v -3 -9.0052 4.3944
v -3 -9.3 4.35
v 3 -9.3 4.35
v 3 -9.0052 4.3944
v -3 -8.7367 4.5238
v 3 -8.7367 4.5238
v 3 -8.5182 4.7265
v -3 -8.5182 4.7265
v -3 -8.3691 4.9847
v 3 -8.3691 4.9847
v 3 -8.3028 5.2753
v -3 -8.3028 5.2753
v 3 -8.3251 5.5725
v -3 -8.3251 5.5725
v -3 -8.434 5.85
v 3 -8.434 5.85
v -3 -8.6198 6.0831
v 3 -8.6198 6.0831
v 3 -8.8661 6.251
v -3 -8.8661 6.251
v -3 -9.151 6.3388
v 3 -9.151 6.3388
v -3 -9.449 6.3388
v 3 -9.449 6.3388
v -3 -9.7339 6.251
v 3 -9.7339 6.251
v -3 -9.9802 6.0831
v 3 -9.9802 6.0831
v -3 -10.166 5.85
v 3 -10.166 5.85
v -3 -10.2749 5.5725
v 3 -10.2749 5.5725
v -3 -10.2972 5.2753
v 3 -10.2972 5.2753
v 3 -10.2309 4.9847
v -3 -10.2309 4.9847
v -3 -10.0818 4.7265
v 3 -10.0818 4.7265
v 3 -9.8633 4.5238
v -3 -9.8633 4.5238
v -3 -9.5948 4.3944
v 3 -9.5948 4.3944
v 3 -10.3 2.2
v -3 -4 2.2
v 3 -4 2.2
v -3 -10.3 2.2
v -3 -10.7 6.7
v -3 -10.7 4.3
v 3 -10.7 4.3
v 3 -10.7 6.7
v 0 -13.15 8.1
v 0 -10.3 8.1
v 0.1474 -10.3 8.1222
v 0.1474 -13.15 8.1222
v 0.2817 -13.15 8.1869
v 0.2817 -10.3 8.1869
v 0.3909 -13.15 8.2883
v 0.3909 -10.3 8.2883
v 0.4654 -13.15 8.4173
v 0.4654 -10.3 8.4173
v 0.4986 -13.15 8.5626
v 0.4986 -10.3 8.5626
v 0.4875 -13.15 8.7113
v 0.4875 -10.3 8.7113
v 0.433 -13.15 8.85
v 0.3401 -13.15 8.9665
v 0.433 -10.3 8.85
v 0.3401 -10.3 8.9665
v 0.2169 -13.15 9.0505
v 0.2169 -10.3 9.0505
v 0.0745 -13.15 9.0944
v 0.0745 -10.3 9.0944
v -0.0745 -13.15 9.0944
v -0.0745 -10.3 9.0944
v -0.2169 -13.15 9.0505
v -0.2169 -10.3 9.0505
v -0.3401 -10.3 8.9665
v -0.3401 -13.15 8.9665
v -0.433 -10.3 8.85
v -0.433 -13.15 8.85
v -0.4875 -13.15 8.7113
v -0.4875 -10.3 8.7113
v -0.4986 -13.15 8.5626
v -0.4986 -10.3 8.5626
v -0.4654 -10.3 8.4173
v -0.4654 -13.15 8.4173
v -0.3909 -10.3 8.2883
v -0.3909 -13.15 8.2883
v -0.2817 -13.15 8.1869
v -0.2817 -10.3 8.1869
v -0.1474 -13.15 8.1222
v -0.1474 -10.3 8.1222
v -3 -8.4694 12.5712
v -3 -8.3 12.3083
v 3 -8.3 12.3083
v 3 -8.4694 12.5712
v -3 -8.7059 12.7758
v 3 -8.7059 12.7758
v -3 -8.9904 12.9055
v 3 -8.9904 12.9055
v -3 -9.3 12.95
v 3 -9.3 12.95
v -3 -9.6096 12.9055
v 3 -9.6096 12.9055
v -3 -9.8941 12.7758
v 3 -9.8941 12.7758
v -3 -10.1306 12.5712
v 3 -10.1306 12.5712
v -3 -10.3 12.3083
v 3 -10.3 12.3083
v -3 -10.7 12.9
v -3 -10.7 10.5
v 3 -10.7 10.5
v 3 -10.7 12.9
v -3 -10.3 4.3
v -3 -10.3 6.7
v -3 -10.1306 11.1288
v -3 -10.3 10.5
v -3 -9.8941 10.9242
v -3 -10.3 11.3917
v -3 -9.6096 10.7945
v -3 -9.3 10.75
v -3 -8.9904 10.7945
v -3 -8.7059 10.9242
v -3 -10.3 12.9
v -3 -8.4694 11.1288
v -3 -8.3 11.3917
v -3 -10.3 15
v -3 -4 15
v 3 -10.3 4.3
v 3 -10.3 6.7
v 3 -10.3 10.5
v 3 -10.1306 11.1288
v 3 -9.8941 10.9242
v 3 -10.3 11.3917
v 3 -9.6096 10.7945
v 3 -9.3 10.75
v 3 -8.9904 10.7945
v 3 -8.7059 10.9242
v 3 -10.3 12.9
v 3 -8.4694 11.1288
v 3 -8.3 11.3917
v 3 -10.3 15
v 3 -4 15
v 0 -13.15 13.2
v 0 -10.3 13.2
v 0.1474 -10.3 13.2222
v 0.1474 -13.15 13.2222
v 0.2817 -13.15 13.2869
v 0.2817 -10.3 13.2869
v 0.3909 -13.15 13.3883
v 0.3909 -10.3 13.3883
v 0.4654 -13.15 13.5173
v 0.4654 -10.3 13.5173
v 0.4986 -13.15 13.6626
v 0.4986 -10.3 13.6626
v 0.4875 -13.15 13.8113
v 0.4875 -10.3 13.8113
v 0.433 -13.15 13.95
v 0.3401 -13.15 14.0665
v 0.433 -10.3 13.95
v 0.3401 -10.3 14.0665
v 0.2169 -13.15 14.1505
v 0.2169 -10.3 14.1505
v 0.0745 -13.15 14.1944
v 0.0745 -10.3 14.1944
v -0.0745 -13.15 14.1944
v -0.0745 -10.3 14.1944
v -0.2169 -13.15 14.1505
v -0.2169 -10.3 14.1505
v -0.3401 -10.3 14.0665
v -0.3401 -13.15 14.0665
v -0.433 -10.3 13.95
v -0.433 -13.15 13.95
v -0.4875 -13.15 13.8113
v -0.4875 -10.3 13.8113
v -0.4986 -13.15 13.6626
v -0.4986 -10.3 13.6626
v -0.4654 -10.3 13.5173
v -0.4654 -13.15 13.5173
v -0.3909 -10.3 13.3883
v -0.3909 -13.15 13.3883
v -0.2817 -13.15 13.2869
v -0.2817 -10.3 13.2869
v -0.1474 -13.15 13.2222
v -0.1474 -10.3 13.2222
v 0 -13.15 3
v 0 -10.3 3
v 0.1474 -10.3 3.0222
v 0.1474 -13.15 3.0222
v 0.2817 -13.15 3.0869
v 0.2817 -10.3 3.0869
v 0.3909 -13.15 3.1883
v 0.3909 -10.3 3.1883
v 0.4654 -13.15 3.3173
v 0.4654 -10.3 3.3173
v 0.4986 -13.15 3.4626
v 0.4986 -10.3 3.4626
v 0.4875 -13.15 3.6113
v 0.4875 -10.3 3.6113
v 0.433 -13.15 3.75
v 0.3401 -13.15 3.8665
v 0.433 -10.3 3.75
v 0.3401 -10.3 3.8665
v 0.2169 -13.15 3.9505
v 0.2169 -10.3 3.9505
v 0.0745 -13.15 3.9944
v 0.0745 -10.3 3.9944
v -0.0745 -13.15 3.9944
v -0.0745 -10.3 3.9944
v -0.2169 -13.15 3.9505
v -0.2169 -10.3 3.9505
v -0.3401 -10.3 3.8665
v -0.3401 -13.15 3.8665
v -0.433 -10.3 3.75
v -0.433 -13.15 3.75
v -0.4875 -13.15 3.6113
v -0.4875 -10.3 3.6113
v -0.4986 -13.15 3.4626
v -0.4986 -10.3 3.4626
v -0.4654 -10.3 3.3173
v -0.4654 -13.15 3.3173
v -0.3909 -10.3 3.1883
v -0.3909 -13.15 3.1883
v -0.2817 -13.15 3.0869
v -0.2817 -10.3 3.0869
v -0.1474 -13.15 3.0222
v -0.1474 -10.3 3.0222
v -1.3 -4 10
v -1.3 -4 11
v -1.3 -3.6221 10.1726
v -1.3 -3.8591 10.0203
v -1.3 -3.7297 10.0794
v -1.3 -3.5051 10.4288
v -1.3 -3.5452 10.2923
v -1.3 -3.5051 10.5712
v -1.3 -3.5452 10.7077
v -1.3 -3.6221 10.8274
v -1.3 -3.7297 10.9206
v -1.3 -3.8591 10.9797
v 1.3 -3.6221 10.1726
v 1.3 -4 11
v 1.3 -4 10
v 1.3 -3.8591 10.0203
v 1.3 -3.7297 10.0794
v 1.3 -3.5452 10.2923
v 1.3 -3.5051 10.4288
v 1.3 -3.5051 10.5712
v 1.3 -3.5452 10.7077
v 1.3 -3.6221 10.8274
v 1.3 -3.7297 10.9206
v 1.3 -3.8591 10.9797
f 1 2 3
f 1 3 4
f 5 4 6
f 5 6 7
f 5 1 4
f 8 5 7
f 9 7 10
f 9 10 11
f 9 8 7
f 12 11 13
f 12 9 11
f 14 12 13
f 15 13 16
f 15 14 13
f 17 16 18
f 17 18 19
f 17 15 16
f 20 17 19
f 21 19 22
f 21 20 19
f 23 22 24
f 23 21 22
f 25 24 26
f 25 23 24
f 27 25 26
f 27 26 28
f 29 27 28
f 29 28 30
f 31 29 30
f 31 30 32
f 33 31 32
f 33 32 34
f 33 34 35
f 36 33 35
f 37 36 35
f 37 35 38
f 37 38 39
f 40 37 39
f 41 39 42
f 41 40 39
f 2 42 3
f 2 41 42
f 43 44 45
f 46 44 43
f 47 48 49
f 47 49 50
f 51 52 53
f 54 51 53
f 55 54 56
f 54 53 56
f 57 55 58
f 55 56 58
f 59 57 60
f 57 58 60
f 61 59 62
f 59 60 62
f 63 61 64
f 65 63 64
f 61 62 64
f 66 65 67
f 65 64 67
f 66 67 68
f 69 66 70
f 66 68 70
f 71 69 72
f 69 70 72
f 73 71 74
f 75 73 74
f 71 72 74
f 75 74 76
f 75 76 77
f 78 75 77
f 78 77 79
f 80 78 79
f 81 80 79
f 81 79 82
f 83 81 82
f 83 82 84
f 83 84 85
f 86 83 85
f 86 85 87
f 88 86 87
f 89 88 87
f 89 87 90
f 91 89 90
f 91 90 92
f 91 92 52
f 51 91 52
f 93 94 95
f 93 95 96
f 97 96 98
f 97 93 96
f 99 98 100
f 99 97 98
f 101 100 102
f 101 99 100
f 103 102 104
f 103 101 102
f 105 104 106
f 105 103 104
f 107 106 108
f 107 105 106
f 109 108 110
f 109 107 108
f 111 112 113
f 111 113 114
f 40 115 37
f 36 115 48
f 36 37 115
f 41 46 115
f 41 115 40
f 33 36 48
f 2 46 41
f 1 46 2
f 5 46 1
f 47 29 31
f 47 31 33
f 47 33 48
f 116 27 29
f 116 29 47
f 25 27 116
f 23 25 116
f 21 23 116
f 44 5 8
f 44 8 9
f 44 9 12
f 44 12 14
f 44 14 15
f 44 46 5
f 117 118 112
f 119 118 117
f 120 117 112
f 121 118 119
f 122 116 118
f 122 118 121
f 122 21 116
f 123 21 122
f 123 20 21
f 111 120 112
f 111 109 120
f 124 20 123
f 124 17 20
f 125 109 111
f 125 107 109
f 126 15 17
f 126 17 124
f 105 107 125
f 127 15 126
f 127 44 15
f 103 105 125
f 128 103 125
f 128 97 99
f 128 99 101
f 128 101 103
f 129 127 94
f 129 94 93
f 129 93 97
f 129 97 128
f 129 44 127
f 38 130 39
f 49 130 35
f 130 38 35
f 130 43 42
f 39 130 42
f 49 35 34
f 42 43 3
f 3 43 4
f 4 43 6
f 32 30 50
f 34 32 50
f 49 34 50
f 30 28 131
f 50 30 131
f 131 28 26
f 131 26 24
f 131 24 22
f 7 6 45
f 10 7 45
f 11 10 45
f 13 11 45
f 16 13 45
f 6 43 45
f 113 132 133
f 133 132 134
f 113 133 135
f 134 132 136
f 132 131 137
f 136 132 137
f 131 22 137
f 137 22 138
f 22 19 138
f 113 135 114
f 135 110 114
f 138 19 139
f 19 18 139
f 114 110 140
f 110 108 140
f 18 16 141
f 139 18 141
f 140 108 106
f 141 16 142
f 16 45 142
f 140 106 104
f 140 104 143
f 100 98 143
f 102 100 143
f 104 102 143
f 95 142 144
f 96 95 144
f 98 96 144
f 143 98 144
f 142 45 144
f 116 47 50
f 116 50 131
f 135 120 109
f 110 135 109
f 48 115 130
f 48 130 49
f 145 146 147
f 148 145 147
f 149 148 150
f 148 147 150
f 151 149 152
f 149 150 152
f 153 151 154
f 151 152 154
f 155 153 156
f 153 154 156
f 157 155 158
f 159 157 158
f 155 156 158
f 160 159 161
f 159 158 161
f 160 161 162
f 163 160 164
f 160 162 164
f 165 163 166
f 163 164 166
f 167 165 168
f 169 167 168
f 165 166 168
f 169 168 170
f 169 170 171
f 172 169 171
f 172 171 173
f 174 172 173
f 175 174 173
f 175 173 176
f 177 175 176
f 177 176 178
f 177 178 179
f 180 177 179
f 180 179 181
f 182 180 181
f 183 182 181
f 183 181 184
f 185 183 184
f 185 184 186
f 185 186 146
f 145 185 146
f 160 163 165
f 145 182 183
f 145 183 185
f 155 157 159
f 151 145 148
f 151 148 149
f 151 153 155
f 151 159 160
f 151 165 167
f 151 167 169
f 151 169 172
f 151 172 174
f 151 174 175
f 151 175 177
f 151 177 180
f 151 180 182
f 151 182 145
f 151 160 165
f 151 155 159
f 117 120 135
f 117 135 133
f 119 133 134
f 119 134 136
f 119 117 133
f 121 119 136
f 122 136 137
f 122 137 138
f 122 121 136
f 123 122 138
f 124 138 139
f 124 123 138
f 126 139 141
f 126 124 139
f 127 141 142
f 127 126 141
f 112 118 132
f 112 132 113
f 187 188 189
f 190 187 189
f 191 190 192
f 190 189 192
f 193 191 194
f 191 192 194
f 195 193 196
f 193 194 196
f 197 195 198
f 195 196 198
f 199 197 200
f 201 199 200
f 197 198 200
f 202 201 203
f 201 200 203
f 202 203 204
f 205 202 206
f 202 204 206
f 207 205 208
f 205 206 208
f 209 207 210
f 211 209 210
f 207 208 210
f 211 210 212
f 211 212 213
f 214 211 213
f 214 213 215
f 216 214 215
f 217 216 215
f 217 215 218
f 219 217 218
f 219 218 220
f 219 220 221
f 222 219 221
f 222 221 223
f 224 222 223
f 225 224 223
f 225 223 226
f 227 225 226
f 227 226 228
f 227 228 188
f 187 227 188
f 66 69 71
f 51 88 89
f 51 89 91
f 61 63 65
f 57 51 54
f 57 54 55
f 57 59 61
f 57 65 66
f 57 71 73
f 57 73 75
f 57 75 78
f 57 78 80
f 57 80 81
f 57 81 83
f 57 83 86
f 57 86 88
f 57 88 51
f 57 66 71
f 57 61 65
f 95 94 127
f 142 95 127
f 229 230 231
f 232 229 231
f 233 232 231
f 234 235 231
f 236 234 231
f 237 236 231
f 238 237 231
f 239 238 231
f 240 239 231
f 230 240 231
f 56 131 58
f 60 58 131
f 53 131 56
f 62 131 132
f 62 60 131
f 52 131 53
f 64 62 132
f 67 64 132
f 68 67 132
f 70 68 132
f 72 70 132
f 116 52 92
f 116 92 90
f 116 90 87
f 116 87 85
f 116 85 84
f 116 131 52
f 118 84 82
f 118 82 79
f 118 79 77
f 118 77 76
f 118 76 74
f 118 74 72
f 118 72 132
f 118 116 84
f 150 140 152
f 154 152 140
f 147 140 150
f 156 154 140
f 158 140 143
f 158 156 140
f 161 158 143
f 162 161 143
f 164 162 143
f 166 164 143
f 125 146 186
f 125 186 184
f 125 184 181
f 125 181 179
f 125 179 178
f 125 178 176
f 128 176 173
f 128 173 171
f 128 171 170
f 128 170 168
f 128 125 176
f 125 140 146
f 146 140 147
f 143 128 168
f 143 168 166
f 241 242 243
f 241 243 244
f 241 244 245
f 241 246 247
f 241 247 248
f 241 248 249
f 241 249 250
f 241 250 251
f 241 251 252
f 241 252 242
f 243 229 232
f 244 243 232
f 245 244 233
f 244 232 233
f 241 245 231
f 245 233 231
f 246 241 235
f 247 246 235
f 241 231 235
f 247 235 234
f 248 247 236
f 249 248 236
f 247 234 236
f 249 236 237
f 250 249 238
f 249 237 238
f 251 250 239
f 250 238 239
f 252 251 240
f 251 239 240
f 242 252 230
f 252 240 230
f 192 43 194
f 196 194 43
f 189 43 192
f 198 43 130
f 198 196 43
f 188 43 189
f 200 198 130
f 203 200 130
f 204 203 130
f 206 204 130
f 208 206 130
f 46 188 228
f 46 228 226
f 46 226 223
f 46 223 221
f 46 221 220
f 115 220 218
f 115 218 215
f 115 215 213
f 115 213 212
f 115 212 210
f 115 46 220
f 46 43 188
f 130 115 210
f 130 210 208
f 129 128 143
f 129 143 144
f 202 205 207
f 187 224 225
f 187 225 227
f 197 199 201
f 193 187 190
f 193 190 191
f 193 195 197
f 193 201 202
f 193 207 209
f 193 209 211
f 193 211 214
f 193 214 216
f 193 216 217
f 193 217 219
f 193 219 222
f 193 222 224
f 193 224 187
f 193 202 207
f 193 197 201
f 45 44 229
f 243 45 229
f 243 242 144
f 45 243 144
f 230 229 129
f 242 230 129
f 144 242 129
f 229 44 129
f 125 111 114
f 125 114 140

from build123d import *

# Parameters (mm, degrees)
SKETCH090_R             = 1
PAD055_DEPTH            = 6
CYLINDER080_R           = 0.5
CYLINDER080_DEPTH       = 3
LINEARPATTERN001_COUNT  = 3
LINEARPATTERN001_PITCH  = 5.1
CYLINDER081_R           = 0.5
CYLINDER081_DEPTH       = 2.6
BODY073_PITCH_ANGLE     = 88.936822
BODY073_PLACEMENT_ANGLE = -90
BODY074_ROLL_ANGLE      = 1.063178
BODY074_PLACEMENT_ANGLE = -90
BODY075_PLACEMENT_ANGLE = 90
BODY076_PLACEMENT_ANGLE = 90


with BuildPart() as part:
    # Sketch090 → Pad055 (new body)
    with BuildSketch(Plane.XY):
        Polygon((6.4, 3.15), (6.4, -3.15), (4.3, -3.15), (4.3, -3.55), (1.9, -3.55), (1.9, -3.15), (-1.9, -3.15), (-1.9, -3.55), (-4.3, -3.55), (-4.3, -3.15), (-6.4, -3.15), (-6.4, 3.15), (-3.4, 3.15), align=None)
        with Locations((3.25, -2.15)):
            Circle(SKETCH090_R, mode=Mode.SUBTRACT)
        with BuildLine():
            ThreePointArc((-3.708258, -1.15), (-4.35, -2.15), (-3.708258, -3.15))
            Line((-2.791742, -3.15), (-3.708258, -3.15))
            ThreePointArc((-2.791742, -3.15), (-2.15, -2.15), (-2.791742, -1.15))
            Line((-3.708258, -1.15), (-2.791742, -1.15))
        make_face(mode=Mode.SUBTRACT)
    extrude(amount=PAD055_DEPTH)

    # Cylinder080 → Cylinder080 (join)
    with BuildSketch(Plane(origin=(-5.1, -3, 3), x_dir=(1, 0, 0), z_dir=(0, -1, 0))):
        Circle(CYLINDER080_R)
    cylinder080 = extrude(amount=CYLINDER080_DEPTH)

    # LinearPattern001: Cylinder080 ×3
    with Locations(*[(i * LINEARPATTERN001_PITCH, 0, 0) for i in range(1, LINEARPATTERN001_COUNT)]):
        add(cylinder080)

    # Cylinder081 → Cylinder081 (join)
    with BuildSketch(Plane(origin=(-1.9, 3.15, 1.7), x_dir=(1, 0, 0), z_dir=(0, 0, 1))):
        Circle(CYLINDER081_R)
    extrude(amount=CYLINDER081_DEPTH)


with BuildPart() as part_1:
    # Body073 pitch: moved
    add(part.part.rotate(Axis((0, 0, 0), (0, 1, 0)), BODY073_PITCH_ANGLE))


with BuildPart() as part_2:
    # Body073 placement: moved
    add(part_1.part.moved(Location((-7.15, 2.882282, 8.601102))).rotate(Axis((-7.15, 2.882282, 8.601102), (0, 0, 1)), BODY073_PLACEMENT_ANGLE))


with BuildPart() as part_3:
    # Body074 roll: moved
    add(part_2.part.rotate(Axis((0, 0, 0), (1, 0, 0)), BODY074_ROLL_ANGLE))


with BuildPart() as part_4:
    # Body074 placement: moved
    add(part_3.part.moved(Location((0.277807, 0, -0.053101))).rotate(Axis((0.277807, 0, -0.053101), (0, 0, 1)), BODY074_PLACEMENT_ANGLE))


with BuildPart() as part_5:
    # Body075 placement: moved
    add(part_4.part.moved(Location((0, 0.105928, 0))).rotate(Axis((0, 0.105928, 0), (0, 0, -1)), BODY075_PLACEMENT_ANGLE))


with BuildPart() as part_6:
    # Body076 placement: moved
    add(part_5.part.moved(Location((-0.105928, 0, 0))).rotate(Axis((-0.105928, 0, 0), (0, 0, -1)), BODY076_PLACEMENT_ANGLE))


solid = part_6.part
